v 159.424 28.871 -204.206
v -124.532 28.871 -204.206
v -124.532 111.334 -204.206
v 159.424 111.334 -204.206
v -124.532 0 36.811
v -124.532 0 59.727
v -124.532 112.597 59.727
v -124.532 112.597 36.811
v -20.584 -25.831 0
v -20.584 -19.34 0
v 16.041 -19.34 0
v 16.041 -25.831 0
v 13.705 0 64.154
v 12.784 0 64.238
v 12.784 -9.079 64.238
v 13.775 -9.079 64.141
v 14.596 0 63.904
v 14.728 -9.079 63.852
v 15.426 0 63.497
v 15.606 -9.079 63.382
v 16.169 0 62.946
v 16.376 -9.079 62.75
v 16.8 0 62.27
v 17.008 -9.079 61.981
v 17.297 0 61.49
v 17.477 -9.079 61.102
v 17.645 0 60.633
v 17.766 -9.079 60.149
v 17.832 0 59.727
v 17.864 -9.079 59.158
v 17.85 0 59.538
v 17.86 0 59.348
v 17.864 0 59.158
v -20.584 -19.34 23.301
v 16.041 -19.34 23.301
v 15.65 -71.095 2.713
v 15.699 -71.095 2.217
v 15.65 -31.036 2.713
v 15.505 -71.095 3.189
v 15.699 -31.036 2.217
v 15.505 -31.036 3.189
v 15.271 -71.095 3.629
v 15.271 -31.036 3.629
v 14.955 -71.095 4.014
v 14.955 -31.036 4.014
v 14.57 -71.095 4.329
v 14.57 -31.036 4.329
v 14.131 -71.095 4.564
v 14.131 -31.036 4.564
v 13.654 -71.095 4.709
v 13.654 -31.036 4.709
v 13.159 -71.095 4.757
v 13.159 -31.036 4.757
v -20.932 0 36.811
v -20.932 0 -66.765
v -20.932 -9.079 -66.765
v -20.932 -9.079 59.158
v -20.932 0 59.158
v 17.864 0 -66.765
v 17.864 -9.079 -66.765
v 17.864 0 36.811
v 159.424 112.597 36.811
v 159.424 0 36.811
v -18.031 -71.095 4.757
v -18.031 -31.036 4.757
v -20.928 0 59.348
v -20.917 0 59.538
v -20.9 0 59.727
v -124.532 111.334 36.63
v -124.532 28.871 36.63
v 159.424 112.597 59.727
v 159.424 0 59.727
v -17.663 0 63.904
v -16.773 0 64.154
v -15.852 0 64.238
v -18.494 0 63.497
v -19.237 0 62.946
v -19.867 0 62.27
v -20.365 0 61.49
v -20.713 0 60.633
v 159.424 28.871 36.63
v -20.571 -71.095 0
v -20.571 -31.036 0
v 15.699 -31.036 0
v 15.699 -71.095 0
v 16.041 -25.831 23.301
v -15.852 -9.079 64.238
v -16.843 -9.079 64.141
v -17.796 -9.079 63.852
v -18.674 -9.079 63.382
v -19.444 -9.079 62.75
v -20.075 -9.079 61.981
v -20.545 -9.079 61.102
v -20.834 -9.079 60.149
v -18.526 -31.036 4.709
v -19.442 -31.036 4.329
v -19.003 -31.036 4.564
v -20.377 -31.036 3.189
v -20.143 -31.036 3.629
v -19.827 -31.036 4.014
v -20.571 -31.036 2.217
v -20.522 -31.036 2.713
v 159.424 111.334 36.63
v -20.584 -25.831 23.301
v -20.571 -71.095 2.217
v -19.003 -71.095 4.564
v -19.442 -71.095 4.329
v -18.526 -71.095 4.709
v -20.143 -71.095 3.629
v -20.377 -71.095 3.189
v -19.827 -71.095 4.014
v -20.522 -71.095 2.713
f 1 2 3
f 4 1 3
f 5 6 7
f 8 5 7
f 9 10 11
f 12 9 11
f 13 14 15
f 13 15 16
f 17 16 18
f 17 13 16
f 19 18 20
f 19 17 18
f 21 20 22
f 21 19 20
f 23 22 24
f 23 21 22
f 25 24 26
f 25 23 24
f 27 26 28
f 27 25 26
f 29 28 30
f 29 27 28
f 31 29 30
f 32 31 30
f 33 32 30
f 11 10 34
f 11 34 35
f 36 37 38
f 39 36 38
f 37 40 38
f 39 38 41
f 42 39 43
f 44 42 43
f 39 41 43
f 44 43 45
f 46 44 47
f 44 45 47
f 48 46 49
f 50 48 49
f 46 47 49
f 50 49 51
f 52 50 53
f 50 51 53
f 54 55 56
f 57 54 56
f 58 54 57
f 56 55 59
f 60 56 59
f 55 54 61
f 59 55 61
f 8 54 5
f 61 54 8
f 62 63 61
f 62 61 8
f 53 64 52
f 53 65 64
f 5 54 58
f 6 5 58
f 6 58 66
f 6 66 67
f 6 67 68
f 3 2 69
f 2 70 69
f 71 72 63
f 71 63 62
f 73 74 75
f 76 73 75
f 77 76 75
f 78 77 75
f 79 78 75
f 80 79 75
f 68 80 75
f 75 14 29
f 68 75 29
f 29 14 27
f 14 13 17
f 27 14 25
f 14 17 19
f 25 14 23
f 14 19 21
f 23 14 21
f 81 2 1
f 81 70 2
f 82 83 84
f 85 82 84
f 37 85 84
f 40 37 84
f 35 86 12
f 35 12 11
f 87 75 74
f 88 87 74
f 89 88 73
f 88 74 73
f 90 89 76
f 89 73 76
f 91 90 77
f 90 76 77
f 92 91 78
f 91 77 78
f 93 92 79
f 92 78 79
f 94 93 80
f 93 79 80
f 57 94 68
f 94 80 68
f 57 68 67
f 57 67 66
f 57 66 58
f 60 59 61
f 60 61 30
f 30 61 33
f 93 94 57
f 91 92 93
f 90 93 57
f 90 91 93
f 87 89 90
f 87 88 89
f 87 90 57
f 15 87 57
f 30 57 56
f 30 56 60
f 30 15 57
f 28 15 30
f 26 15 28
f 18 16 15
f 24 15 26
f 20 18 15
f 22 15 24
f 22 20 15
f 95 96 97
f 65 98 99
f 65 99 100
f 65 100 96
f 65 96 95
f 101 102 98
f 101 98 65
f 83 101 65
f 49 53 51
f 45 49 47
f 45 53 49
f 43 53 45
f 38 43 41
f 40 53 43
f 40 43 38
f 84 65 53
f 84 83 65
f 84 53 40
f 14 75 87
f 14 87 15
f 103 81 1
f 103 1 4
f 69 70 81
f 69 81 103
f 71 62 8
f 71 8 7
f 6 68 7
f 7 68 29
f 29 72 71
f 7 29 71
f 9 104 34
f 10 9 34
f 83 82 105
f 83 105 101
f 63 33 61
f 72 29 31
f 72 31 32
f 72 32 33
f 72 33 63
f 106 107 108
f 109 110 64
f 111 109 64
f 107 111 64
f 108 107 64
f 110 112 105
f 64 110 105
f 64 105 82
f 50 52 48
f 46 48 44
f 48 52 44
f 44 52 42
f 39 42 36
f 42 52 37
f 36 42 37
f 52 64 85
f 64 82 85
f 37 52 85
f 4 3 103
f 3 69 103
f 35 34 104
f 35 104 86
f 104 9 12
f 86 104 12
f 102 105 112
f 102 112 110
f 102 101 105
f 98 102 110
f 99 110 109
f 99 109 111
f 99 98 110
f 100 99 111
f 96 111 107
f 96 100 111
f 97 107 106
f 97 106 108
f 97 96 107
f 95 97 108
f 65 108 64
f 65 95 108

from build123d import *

# Parameters (mm, degrees)
F0_W         = 38.795568049
F0_H         = 131.0027092695
F1_DEPTH     = 9.0788379312
F2_W         = 36.6244800389
F2_H         = 6.4905062318
F3_DEPTH     = 23.3007315546
F4_W         = 36.2693443894
F4_H         = 40.0586724281
F5_DEPTH     = 4.7574751079
F6_R         = 2.54
F7_W         = 112.597361207
F7_H         = 22.9164585471
F9_DEPTH     = 159.4235897064
F8_W         = 82.463145256
F8_H         = 127.2133886814
F10_DEPTH    = 124.53237921
F12_DEPTH    = 113.6232465506
F13_T1_DEPTH = 21.7788379312


# Not quite as in the source:
# - a fillet or chamfer that OpenCascade refuses, or shapes differently, is made with other operations: its cross-section is extruded or revolved along the edge and cut away or added


with BuildPart() as f1:
    # F0 (on Front) → F1 (new body)
    with BuildSketch(Plane.XZ):
        with Locations((-1.533780247, -1.2631490827)):
            Rectangle(F0_W, F0_H)
    extrude(amount=F1_DEPTH)

    # F7 (on Right) → F9 (join)
    with BuildSketch(Plane.YZ):
        with Locations((56.2986806035, 48.2688806951)):
            Rectangle(F7_W, F7_H)
    extrude(amount=F9_DEPTH)

    # F10#2 (add): a face of the model
    f10_2_faces = [f1.faces().sort_by_distance(p)[0] for p in [
        (0, 56.2986806035, 48.2688806951),
    ]]
    extrude(f10_2_faces, amount=F10_DEPTH)


with BuildPart() as f3:
    # F2 (on Top) → F3 (new body)
    with BuildSketch(Plane.XY):
        with Locations((-2.2713560611, -22.5855186582)):
            Rectangle(F2_W, F2_H)
    extrude(amount=F3_DEPTH)


with BuildPart() as f5:
    # F4 (on Top) → F5 (new body)
    with BuildSketch(Plane.XY):
        with Locations((-2.4360008538, -51.0658025742)):
            Rectangle(F4_W, F4_H)
    extrude(amount=F5_DEPTH)

    # F6
    f6_edges = [f5.edges().sort_by_distance(p)[0] for p in [
        (15.698671, -51.065803, 4.757475),
        (-20.570673, -51.065803, 4.757475),
    ]]
    fillet(f6_edges, radius=F6_R)


with BuildPart() as f9:
    # F8 (on Right) → F9, piece 2 (new body)
    with BuildSketch(Plane.YZ):
        with Locations((70.1026767492, -26.9764810801)):
            Rectangle(F8_W, F8_H)
    extrude(amount=F9_DEPTH)

    # F10 (add): a face of the model
    f10_faces = [f9.faces().sort_by_distance(p)[0] for p in [
        (0, 70.1026767492, -26.9764810801),
    ]]
    extrude(f10_faces, amount=F10_DEPTH)

    # F11: union F1
    add(f1.part)

    # F12 (add): a face of the model
    f12_faces = [f9.faces().sort_by_distance(p)[0] for p in [
        (17.4456052482, 70.1026767492, -90.5831754208),
    ]]
    extrude(f12_faces, amount=F12_DEPTH)

    # F13: fillet of radius 5.08 on 2 edges, made by hand

    # F13_s2 → F13_t1 (cut)
    with BuildSketch(Plane.XZ):
        with BuildLine():
            ThreePointArc((12.7840037775, 64.2382055521), (16.3761062259, 62.7503080005), (17.8640037775, 59.1582055521))
            Line((17.8640037775, 59.1582055521), (17.8640037775, 64.2382055521))
            Line((17.8640037775, 64.2382055521), (12.7840037775, 64.2382055521))
        make_face()
        with BuildLine():
            ThreePointArc((-15.8515642715, 64.2382055521), (-19.4436667199, 62.7503080005), (-20.9315642715, 59.1582055521))
            Line((-20.9315642715, 59.1582055521), (-20.9315642715, 64.2382055521))
            Line((-20.9315642715, 64.2382055521), (-15.8515642715, 64.2382055521))
        make_face()
    extrude(amount=F13_T1_DEPTH, mode=Mode.SUBTRACT)


solid = Compound([f3.part, f5.part, f9.part])
